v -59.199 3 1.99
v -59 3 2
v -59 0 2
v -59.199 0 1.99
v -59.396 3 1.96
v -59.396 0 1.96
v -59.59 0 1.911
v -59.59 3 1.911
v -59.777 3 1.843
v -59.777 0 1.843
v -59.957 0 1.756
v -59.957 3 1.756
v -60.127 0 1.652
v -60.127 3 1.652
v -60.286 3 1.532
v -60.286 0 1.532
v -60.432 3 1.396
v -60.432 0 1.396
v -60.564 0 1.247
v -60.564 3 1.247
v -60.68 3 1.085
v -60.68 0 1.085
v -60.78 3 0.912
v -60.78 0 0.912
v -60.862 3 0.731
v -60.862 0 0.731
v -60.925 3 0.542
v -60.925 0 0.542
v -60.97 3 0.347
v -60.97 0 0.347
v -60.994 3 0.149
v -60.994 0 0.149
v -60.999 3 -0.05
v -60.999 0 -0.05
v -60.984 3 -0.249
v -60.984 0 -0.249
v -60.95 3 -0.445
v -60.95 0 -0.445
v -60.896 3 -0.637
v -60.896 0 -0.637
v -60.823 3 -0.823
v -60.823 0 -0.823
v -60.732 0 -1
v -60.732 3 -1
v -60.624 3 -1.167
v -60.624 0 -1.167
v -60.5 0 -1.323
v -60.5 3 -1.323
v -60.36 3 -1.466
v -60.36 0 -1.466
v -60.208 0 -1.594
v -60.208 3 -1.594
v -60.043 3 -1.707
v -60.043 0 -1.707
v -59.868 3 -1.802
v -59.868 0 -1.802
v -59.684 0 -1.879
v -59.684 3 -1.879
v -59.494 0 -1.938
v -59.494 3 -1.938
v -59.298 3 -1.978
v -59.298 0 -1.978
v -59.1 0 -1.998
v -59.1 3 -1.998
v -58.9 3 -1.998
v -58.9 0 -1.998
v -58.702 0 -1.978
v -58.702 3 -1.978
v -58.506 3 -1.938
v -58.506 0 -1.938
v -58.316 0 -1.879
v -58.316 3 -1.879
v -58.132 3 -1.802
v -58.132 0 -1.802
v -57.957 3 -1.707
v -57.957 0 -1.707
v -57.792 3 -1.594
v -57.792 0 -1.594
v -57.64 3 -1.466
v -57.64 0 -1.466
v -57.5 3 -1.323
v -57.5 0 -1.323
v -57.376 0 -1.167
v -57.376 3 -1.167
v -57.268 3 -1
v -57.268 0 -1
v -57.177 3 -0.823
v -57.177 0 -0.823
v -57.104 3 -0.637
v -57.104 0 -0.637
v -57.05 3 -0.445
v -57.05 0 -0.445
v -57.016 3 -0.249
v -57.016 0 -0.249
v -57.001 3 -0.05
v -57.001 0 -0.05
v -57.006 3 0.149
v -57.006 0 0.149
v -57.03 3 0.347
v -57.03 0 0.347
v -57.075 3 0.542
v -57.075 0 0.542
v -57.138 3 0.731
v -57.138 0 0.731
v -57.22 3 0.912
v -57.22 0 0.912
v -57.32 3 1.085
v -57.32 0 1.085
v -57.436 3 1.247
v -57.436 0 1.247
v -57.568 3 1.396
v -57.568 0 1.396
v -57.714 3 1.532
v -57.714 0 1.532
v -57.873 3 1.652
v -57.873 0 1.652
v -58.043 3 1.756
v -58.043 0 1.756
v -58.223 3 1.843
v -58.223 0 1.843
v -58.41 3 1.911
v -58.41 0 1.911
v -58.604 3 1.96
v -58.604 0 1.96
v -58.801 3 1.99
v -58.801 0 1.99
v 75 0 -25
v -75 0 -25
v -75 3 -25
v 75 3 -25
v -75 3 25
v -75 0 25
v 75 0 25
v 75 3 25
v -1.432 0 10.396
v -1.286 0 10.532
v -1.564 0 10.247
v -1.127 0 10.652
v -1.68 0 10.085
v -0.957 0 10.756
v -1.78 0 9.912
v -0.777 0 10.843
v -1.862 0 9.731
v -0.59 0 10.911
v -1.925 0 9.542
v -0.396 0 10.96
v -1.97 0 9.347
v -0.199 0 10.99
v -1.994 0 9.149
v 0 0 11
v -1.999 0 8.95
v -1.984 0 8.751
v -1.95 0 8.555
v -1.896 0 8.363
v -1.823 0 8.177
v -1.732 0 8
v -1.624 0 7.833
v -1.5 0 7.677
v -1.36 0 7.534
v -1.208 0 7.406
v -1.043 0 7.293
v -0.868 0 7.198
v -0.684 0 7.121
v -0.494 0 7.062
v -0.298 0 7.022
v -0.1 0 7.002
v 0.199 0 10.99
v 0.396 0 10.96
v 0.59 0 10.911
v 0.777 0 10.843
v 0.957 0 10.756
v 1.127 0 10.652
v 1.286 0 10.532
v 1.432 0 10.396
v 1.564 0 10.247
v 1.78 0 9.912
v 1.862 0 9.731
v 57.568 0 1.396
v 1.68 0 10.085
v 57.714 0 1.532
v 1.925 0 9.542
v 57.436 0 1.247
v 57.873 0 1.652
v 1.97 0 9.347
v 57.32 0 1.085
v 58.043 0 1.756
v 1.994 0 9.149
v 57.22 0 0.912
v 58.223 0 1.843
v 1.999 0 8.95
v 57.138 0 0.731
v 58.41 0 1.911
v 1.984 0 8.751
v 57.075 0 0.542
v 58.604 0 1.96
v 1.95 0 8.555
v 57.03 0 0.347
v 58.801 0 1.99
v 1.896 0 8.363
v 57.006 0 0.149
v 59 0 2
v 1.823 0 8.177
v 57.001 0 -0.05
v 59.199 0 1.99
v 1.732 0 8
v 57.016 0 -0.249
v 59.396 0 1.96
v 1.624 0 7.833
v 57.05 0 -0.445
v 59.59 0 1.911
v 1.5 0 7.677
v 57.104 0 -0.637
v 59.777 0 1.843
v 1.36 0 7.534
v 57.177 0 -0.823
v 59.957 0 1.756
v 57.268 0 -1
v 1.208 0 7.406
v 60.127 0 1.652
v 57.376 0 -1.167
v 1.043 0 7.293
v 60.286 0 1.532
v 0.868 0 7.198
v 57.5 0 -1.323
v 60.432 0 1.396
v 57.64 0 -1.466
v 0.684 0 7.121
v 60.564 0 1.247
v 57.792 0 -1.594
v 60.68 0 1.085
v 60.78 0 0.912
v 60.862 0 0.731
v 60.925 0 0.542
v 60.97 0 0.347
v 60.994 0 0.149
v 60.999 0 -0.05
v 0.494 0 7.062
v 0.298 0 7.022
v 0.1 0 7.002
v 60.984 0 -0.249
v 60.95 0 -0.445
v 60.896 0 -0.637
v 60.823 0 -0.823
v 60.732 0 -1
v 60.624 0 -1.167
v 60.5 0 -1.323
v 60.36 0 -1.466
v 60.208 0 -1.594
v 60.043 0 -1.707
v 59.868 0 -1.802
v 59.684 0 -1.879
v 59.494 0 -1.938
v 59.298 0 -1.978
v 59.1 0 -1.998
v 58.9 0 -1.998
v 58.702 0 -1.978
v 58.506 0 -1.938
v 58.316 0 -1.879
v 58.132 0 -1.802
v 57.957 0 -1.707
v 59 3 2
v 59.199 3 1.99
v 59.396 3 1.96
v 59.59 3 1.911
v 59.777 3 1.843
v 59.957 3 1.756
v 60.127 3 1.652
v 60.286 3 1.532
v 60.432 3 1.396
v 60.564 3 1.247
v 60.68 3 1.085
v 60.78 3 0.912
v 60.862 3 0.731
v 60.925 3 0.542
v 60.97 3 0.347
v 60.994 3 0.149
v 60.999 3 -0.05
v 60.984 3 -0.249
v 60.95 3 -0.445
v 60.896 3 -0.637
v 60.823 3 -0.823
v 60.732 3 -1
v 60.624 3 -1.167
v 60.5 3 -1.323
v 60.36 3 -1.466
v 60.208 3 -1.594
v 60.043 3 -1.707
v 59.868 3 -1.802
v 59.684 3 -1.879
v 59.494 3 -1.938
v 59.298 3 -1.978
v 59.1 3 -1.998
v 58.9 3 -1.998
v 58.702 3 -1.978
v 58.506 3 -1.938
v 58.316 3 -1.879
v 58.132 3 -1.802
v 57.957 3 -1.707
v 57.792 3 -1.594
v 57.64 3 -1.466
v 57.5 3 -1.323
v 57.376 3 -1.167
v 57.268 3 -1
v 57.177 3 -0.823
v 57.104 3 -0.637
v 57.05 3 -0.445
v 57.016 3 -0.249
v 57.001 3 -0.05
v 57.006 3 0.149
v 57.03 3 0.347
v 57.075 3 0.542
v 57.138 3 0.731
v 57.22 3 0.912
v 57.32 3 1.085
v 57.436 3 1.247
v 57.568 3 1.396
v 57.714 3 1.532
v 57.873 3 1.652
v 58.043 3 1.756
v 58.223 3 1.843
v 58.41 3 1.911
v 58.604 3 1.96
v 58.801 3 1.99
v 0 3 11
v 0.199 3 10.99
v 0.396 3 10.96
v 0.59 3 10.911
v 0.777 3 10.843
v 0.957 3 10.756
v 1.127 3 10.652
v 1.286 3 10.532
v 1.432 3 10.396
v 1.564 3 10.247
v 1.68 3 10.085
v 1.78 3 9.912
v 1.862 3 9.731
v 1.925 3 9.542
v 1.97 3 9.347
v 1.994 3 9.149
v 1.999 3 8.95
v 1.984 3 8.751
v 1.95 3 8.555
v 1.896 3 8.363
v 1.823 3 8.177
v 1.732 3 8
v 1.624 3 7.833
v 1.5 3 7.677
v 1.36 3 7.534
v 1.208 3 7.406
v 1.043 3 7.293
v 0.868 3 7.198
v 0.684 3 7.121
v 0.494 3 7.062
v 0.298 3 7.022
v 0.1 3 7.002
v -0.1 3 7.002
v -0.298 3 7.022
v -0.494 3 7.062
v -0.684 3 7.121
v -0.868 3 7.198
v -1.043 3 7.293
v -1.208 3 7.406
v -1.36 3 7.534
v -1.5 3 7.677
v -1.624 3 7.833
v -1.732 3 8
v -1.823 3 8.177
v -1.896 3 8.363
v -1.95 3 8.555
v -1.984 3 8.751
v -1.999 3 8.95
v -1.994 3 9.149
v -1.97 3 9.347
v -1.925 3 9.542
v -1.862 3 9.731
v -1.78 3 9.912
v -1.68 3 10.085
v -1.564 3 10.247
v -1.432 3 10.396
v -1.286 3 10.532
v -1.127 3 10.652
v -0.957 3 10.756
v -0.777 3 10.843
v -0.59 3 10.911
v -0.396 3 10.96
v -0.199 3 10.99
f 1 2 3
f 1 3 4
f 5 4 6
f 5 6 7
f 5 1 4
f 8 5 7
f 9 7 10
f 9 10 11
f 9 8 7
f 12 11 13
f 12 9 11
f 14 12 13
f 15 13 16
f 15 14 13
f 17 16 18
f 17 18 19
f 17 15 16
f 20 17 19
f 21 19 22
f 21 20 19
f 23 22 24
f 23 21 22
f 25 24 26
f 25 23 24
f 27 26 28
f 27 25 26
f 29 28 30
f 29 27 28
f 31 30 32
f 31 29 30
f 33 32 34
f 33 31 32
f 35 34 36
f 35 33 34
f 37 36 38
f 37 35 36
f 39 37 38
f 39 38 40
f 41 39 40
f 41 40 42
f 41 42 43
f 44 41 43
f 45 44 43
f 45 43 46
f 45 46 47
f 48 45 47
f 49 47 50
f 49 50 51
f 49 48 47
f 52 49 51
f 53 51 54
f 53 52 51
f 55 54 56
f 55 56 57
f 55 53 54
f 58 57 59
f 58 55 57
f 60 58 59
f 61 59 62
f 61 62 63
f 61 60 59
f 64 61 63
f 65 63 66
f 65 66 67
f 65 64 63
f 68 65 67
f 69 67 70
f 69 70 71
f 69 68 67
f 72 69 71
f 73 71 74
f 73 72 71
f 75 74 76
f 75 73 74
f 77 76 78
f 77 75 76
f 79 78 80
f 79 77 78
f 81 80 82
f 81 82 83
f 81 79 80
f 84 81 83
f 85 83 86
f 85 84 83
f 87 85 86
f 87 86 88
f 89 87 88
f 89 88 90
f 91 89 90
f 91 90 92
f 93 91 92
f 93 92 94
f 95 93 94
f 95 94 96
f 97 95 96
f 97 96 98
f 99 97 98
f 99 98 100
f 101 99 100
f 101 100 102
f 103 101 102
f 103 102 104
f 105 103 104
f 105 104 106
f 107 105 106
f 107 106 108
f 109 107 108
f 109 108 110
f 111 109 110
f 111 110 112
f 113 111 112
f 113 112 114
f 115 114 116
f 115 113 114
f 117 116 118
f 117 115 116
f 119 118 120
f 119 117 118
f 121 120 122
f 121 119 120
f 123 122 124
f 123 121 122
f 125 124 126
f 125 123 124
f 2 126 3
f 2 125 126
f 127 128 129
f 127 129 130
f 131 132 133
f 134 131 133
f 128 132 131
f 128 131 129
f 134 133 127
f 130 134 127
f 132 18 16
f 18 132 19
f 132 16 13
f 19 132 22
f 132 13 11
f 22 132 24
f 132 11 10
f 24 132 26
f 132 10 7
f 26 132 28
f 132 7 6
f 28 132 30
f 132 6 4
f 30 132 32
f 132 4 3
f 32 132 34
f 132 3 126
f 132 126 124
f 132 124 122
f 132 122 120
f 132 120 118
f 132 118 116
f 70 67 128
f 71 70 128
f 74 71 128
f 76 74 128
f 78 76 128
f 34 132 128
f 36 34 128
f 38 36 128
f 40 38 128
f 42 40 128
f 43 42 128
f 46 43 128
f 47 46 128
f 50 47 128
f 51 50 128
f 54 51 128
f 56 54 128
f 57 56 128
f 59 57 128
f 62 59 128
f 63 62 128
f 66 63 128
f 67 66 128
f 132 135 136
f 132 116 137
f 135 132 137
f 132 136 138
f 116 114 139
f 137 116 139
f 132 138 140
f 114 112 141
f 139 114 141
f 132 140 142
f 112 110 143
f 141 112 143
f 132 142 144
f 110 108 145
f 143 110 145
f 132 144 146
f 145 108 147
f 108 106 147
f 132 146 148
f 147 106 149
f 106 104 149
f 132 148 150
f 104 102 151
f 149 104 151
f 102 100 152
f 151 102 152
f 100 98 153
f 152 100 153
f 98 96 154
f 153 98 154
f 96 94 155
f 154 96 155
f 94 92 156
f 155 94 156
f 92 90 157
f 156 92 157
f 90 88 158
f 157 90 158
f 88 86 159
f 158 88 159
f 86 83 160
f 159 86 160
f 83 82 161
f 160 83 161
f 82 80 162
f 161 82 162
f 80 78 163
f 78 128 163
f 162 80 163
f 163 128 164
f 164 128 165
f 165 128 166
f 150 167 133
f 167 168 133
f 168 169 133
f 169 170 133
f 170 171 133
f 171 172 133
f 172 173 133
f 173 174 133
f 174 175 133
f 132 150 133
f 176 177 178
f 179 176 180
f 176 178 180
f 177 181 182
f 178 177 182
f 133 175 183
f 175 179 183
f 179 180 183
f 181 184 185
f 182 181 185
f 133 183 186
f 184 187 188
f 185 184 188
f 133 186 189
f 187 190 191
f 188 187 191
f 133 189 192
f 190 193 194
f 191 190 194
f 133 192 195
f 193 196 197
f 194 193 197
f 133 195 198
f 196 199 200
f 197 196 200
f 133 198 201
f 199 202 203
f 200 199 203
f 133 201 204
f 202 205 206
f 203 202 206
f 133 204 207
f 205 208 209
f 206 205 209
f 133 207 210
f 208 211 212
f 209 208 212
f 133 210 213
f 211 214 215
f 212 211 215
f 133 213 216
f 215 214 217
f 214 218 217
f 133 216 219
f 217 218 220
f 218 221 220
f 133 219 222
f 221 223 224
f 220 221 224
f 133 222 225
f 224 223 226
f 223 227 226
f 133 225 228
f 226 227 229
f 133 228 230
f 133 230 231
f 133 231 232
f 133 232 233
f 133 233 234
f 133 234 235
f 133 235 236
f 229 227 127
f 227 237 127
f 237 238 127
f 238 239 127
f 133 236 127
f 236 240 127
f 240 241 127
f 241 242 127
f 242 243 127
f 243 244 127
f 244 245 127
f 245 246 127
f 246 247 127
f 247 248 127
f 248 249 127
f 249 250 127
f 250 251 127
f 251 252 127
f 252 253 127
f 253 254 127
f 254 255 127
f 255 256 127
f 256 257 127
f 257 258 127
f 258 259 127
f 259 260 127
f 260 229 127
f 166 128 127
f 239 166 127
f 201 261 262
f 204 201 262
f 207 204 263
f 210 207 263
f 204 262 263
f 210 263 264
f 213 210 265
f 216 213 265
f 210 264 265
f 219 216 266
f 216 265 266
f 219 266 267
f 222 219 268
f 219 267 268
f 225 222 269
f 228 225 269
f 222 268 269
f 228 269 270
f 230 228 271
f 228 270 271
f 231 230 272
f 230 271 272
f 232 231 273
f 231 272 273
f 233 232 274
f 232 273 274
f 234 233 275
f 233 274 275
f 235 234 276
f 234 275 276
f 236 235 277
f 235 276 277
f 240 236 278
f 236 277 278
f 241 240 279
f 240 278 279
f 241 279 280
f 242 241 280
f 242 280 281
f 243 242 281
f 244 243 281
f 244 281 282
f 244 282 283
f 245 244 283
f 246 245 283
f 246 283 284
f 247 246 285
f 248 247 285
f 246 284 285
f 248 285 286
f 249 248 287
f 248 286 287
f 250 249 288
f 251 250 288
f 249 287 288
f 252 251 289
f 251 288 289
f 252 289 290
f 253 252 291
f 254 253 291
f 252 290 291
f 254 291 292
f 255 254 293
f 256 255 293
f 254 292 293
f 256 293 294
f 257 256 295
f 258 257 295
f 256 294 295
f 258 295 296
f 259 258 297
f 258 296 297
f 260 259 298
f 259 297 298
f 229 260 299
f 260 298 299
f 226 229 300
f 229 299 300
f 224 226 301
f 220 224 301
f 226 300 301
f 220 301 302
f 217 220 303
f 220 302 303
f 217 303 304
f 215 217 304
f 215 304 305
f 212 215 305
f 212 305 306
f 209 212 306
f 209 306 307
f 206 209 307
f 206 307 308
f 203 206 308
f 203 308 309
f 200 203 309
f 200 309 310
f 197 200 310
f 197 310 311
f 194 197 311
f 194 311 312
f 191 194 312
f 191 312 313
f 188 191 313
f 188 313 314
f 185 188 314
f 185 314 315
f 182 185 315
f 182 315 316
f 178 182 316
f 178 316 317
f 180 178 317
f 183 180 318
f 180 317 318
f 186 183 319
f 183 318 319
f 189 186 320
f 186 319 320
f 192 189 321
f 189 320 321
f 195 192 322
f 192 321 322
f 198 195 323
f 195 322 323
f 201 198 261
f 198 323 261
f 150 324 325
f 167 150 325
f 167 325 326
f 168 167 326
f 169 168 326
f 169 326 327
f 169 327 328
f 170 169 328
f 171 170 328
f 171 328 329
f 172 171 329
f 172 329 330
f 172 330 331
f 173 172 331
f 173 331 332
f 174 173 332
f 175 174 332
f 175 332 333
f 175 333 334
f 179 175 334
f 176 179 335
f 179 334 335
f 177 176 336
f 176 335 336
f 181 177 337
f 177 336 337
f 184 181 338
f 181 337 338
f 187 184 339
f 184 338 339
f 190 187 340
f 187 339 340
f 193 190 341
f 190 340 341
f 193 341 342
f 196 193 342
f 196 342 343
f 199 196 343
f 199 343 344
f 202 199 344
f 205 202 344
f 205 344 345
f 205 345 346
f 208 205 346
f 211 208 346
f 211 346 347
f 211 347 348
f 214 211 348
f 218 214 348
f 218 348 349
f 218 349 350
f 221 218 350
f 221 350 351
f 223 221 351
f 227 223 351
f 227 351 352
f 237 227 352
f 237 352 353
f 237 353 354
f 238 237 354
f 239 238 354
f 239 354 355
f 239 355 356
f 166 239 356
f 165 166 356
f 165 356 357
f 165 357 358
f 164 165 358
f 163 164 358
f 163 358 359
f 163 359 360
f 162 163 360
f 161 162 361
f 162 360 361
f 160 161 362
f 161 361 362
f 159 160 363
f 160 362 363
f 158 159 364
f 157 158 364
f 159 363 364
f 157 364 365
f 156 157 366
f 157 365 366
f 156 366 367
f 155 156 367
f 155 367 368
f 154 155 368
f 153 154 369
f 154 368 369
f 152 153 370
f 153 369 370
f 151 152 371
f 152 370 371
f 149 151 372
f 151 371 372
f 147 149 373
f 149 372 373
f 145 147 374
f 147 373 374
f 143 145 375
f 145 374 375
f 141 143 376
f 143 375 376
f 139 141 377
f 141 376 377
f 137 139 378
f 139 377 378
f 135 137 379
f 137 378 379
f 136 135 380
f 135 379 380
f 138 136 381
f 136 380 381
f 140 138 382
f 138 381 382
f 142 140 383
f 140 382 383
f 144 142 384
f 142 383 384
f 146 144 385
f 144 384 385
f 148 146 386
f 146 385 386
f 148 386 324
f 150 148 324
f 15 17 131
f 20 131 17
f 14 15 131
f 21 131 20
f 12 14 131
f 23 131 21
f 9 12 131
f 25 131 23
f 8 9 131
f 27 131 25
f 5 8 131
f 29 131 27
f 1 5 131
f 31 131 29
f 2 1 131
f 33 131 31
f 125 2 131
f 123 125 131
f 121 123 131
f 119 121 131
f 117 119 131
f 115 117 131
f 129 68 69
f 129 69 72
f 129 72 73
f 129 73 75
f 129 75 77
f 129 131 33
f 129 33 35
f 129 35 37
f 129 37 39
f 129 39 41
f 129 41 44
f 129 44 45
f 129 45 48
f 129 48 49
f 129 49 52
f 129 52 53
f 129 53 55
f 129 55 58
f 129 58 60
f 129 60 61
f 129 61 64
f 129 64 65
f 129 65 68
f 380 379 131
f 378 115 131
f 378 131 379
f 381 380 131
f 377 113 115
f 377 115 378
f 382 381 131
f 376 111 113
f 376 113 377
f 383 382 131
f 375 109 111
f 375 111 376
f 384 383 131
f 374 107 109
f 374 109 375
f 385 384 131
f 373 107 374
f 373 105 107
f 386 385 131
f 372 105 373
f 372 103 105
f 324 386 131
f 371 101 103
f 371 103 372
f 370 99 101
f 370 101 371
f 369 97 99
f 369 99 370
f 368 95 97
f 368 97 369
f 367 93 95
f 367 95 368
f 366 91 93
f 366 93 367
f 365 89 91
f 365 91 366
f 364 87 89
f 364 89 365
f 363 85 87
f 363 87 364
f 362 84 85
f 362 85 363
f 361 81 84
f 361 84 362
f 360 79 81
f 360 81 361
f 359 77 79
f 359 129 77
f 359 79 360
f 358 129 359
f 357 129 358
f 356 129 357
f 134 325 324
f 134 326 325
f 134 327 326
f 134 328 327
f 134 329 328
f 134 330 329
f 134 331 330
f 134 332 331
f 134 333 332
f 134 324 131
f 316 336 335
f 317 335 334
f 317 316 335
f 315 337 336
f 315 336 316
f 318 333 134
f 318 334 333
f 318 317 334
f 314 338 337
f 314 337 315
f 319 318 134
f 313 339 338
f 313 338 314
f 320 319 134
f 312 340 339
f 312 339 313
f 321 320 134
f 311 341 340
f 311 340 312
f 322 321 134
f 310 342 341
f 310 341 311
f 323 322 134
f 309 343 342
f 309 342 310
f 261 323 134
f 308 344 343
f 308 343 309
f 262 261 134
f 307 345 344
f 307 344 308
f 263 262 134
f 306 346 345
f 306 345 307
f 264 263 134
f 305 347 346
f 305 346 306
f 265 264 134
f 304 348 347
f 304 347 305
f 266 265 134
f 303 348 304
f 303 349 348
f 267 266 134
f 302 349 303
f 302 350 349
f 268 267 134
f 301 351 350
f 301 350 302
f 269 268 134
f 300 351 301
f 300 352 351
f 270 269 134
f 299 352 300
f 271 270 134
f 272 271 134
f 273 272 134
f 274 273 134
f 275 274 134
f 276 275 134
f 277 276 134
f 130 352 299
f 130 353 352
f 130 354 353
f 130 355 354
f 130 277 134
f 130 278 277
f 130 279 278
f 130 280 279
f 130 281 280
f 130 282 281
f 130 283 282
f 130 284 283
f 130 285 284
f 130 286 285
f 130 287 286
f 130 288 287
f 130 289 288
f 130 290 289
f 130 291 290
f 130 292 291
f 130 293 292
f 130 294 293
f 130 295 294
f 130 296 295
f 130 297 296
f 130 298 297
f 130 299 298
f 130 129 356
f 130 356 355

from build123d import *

# Parameters (mm, degrees)
SKETCH1_W           = 150
SKETCH1_H           = 50
BOSS_EXTRUDE1_DEPTH = 3
SKETCH2_R           = 2
CUT_EXTRUDE1_DEPTH  = 3
CUT_EXTRUDE2_REACH  = 5
SKETCH3_R           = 2


with BuildPart() as part:
    # Sketch1 → Boss-Extrude1 (new body)
    with BuildSketch(Plane(origin=(0, 0, 0), x_dir=(1, 0, 0), z_dir=(0, 1, 0))):
        Rectangle(SKETCH1_W, SKETCH1_H)
    extrude(amount=BOSS_EXTRUDE1_DEPTH)

    # Sketch2 → Cut-Extrude1 (cut)
    with BuildSketch(Plane(origin=(0, 3, 0), x_dir=(1, 0, 0), z_dir=(0, 1, 0))):
        with Locations(Location((59, 0, 0), (0, 0, 270))):  # turned: the seam where the file's is
            Circle(SKETCH2_R)
    cut_extrude1 = extrude(amount=-CUT_EXTRUDE1_DEPTH, mode=Mode.SUBTRACT)

    # Mirror1: Cut-Extrude1 across plane
    add(cut_extrude1.mirror(Plane(origin=(0, 0, 0), x_dir=(0, 0, 1), z_dir=(1, 0, 0))), mode=Mode.SUBTRACT)

    # Sketch3 → Cut-Extrude2 (cut, up to next)
    with BuildSketch(Plane(origin=(0, 3, 0), x_dir=(1, 0, 0), z_dir=(0, 1, 0)), mode=Mode.PRIVATE) as cut_extrude2_sk1:
        with Locations(Location((0, -9, 0), (0, 0, 270))):  # turned: the seam where the file's is
            Circle(SKETCH3_R)
    cut_extrude2_tool1 = extrude(cut_extrude2_sk1.sketch, amount=-CUT_EXTRUDE2_REACH, mode=Mode.PRIVATE) & part.part
    add(cut_extrude2_tool1.solids().sort_by_distance((0, 3, 9))[0], mode=Mode.SUBTRACT)


solid = part.part
